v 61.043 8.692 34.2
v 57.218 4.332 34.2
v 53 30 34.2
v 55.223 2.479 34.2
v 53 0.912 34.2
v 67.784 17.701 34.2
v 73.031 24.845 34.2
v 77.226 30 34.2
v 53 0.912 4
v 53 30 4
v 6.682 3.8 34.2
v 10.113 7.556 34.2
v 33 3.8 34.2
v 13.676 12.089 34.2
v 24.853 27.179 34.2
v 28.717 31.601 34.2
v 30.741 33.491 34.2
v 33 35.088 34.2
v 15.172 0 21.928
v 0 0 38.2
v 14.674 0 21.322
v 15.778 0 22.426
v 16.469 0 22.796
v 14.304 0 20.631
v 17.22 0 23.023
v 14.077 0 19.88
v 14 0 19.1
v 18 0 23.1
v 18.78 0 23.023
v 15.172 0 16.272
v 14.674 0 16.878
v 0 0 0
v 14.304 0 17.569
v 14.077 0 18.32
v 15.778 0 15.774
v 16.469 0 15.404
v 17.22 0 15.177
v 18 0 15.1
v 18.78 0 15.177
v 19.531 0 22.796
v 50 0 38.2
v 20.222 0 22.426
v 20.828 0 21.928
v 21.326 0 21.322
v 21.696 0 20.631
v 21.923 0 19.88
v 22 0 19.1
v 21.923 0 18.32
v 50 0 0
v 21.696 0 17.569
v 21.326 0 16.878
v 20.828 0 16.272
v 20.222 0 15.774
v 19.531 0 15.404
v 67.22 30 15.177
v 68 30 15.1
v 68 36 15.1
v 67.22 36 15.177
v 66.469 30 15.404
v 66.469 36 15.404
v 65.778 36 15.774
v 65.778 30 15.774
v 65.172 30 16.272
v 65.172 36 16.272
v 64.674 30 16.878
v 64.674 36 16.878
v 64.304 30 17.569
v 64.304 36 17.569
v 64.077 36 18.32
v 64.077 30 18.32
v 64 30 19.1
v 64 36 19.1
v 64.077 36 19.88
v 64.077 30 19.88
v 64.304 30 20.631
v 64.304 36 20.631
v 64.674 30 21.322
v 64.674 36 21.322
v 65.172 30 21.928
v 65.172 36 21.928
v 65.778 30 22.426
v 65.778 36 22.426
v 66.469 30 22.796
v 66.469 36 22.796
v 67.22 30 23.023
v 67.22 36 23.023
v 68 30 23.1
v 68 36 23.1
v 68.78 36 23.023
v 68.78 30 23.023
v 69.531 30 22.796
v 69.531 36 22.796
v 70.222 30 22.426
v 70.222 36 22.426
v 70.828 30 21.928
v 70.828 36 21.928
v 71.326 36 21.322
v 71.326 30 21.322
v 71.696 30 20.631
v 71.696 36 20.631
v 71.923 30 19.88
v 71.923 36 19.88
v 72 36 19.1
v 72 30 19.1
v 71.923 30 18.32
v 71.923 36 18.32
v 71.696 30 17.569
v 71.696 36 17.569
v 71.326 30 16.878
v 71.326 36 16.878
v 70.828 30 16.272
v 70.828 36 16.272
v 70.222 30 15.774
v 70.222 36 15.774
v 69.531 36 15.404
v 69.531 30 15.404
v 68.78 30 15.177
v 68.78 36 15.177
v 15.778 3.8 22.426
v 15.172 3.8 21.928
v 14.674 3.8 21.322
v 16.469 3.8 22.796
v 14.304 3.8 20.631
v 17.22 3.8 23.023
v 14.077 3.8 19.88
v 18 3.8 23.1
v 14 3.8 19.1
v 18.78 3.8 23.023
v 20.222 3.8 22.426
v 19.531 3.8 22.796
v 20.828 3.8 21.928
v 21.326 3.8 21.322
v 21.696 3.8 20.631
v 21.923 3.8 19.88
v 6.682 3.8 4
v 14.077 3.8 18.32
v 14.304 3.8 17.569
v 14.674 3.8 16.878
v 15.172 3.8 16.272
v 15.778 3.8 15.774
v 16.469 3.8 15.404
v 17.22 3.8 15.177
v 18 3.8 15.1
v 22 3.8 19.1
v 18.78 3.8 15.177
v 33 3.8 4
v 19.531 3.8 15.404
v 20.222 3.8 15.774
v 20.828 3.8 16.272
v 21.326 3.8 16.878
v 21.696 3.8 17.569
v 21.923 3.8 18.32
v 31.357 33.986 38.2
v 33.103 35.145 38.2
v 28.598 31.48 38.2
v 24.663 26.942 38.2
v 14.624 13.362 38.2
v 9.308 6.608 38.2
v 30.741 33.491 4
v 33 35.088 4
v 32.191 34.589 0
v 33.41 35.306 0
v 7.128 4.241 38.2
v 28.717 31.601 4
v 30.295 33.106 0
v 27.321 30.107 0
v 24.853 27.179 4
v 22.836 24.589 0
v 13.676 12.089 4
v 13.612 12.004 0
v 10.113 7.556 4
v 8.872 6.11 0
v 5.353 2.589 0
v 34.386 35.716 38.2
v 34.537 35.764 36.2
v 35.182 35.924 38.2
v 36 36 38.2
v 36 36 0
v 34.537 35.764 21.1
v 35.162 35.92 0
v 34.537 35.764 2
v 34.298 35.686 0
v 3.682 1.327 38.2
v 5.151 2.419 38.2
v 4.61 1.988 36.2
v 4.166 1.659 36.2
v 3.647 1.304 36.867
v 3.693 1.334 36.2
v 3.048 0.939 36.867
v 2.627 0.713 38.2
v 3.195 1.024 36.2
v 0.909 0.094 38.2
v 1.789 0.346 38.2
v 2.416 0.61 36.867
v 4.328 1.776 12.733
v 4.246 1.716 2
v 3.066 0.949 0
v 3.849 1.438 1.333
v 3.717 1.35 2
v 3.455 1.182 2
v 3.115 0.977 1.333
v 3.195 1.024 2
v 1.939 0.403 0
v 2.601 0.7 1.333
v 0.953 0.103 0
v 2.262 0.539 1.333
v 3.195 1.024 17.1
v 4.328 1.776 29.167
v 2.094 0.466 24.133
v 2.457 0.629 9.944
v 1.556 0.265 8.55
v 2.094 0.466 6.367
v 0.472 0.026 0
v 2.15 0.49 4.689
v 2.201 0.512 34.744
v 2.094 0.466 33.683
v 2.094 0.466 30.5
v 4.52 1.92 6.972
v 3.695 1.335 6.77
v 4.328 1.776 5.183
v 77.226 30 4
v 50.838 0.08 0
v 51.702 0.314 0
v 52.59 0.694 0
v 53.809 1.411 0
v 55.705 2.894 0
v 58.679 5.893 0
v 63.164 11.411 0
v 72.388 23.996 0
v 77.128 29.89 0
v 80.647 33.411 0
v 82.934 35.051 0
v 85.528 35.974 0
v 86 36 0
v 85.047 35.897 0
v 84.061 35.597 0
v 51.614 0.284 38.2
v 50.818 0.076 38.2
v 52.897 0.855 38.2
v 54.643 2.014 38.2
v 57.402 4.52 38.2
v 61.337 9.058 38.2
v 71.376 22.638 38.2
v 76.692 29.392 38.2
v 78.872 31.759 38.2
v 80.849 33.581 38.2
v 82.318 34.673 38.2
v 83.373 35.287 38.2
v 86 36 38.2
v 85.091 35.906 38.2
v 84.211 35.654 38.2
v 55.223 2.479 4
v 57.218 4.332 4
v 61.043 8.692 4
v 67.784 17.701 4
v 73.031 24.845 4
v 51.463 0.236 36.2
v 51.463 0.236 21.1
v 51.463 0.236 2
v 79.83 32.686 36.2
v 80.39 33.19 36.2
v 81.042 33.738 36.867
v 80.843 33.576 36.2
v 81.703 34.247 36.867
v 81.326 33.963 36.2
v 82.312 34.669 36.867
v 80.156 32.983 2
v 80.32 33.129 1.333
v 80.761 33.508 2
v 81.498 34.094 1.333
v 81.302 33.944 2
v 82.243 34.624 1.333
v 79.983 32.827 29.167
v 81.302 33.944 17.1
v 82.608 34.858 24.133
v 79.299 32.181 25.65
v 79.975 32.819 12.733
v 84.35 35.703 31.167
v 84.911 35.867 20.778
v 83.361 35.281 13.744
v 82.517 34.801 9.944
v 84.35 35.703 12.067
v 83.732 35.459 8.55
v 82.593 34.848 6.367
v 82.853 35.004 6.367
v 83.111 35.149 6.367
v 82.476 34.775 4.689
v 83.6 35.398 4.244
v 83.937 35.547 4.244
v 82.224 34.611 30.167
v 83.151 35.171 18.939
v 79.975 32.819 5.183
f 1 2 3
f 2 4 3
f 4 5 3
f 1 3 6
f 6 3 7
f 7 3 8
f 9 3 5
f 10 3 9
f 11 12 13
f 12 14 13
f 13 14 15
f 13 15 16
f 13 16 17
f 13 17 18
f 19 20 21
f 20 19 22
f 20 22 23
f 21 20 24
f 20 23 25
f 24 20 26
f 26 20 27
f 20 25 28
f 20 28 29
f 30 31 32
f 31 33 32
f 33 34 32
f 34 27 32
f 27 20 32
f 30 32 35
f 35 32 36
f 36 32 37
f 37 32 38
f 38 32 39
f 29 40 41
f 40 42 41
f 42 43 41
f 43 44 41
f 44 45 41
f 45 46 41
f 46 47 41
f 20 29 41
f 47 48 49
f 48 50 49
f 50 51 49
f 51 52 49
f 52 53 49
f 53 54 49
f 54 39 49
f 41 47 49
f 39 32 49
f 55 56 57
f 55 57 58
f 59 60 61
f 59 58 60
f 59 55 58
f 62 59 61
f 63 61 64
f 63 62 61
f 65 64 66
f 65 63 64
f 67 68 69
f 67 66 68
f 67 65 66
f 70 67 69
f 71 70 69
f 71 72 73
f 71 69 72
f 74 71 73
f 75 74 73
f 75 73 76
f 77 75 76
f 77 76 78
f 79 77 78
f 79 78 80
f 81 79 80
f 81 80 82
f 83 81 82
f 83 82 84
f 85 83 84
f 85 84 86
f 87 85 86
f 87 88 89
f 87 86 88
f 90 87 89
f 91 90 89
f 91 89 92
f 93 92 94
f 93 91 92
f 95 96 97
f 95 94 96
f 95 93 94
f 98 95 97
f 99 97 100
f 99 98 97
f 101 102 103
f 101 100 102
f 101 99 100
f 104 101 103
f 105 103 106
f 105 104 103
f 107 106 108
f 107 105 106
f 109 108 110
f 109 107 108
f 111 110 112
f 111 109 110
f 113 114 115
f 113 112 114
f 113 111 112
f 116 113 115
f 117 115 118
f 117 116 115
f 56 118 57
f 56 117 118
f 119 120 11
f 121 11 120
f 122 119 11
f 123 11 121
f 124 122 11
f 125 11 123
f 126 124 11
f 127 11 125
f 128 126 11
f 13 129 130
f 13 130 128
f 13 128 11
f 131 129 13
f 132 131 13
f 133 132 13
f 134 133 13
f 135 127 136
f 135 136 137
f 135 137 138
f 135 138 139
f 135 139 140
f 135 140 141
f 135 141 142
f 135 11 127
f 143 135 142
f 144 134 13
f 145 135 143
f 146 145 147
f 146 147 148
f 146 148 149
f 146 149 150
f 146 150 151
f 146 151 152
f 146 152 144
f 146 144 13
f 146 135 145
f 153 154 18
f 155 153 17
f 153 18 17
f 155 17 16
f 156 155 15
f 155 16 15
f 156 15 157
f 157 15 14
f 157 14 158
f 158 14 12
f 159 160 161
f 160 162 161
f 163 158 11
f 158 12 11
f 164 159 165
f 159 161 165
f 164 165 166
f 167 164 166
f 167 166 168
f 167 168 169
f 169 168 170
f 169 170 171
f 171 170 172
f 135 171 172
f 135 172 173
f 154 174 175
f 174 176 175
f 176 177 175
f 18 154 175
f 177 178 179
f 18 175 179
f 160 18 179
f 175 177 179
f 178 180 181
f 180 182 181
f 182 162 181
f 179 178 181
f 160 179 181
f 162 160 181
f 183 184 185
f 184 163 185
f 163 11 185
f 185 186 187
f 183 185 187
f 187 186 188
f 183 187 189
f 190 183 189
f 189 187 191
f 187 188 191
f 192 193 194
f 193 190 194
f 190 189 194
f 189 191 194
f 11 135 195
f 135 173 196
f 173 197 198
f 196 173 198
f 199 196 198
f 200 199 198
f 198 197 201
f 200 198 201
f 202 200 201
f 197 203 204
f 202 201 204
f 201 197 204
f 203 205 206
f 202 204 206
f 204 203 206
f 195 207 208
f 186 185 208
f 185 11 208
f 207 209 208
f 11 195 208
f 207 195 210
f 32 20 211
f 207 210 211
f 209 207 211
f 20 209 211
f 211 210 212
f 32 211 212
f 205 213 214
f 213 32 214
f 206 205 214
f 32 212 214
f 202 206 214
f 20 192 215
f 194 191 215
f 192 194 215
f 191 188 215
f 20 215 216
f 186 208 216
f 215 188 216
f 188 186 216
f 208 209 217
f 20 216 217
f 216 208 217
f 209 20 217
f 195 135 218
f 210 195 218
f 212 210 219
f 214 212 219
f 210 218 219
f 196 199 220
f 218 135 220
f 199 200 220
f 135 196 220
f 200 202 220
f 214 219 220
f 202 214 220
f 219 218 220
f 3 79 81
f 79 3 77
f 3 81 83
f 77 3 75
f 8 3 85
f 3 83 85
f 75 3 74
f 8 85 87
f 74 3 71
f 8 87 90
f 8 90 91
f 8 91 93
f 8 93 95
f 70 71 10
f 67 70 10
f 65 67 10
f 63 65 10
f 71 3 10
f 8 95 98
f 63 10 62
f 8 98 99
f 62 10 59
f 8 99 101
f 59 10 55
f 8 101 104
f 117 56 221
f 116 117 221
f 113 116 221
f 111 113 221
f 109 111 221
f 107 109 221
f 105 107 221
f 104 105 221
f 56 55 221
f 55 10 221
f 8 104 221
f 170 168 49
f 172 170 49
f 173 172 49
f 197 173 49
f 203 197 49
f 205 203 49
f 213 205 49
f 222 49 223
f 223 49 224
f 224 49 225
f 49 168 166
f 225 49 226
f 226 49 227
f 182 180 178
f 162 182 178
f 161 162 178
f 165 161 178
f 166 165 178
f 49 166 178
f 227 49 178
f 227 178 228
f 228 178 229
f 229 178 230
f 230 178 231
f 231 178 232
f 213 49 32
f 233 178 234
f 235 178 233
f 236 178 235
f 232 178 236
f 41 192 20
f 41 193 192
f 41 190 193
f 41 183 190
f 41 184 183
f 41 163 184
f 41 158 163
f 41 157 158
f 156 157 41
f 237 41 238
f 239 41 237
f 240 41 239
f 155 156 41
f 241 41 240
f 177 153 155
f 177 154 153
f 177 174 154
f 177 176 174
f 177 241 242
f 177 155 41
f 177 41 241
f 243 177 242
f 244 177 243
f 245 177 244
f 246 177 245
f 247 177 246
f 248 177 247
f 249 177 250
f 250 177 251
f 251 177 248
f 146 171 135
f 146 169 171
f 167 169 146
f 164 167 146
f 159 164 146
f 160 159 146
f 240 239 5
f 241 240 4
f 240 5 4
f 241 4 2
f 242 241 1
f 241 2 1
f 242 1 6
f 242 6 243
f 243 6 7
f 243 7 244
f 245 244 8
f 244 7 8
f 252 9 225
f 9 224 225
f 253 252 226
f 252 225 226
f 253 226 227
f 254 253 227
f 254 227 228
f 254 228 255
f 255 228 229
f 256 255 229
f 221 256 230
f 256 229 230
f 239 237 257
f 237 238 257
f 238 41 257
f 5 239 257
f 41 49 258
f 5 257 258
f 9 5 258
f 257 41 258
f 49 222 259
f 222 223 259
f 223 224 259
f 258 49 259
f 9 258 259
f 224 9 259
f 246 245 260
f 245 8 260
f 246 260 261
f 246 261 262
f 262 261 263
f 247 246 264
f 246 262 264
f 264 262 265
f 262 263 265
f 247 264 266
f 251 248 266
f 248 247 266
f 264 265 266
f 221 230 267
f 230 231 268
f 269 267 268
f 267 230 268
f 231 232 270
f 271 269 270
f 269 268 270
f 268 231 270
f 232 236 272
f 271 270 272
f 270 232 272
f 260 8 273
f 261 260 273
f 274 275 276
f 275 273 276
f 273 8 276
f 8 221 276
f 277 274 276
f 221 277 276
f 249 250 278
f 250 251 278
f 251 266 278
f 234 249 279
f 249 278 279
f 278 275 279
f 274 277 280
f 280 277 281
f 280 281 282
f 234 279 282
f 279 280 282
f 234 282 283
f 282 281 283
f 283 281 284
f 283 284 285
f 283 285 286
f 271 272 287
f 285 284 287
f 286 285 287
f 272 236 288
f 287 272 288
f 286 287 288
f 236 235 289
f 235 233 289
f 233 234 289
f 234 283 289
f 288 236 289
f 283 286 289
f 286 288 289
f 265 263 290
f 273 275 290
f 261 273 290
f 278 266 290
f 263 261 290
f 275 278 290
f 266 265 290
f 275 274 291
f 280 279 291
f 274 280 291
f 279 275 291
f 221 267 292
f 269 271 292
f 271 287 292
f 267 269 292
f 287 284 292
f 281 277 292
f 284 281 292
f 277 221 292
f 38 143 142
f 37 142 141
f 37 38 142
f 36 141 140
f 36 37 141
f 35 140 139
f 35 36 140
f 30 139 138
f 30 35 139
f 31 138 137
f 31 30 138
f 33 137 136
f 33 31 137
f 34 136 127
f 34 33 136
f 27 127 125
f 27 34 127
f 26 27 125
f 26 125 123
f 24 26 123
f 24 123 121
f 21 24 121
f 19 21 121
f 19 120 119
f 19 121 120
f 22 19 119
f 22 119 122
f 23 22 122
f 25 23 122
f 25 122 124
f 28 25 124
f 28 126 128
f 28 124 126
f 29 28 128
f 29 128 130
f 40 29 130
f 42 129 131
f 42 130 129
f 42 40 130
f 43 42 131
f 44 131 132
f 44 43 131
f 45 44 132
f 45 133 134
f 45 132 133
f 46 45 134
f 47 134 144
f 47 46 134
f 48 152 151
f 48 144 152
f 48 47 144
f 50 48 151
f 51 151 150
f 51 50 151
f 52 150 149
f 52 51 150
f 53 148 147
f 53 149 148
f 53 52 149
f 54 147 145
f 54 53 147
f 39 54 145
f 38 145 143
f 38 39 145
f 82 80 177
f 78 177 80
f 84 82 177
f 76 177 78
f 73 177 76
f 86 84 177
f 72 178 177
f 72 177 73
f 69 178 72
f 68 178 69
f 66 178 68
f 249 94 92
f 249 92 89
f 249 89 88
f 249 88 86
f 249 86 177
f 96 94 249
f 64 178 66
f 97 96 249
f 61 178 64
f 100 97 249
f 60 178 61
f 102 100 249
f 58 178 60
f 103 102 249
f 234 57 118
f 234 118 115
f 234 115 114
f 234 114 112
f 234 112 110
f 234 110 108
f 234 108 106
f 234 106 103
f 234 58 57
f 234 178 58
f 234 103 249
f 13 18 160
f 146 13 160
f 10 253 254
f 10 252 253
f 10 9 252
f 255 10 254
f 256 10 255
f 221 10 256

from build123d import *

# Parameters (mm, degrees)
SKETCH1_W           = 86
SKETCH1_H           = 36
BOSS_EXTRUDE1_DEPTH = 38.2
CUT_EXTRUDE2_DEPTH  = 101.753362227
SKETCH3_R           = 4
CUT_EXTRUDE5_DEPTH  = 101.753362386
SKETCH3_9_R         = 4
CUT_EXTRUDE7_DEPTH  = 101.753362386
SKETCH6_W           = 33
SKETCH6_H           = 30.2
CUT_EXTRUDE8_DEPTH  = 32.2
CUT_EXTRUDE9_START  = -6
SKETCH6_8_W         = 33
SKETCH6_8_H         = 30.2
CUT_EXTRUDE9_DEPTH  = 95.753362386


with BuildPart() as part:
    # Sketch1 → Boss-Extrude1 (new body)
    with BuildSketch(Plane.XY):
        with Locations((43, 18)):
            Rectangle(SKETCH1_W, SKETCH1_H)
    extrude(amount=BOSS_EXTRUDE1_DEPTH)

    # Sketch2 → Cut-Extrude2 (cut, through all)
    with BuildSketch(Plane.XY):
        with BuildLine():
            Line((86, 36), (86, 0))
            Line((86, 0), (50, 0))
            add(Edge.make_bspline(
                [(50, 0), (60, 0), (76, 36), (86, 36)],
                knots=[0, 0, 0, 0, 1, 1, 1, 1], degree=3))
        make_face()
        with BuildLine():
            Line((36, 36), (0, 36))
            Line((0, 36), (0, 0))
            add(Edge.make_bspline(
                [(36, 36), (26, 36), (10, 0), (0, 0)],
                knots=[0, 0, 0, 0, 1, 1, 1, 1], degree=3))
        make_face()
    extrude(amount=CUT_EXTRUDE2_DEPTH, mode=Mode.SUBTRACT)

    # Sketch3 → Cut-Extrude5 (cut, through all)
    with BuildSketch(Plane(origin=(0, 0, 0), x_dir=(1, 0, 0), z_dir=(0, 1, 0))):
        with Locations((18, -19.1)):
            Circle(SKETCH3_R)
    extrude(amount=CUT_EXTRUDE5_DEPTH, mode=Mode.SUBTRACT)

    # Sketch3<9> → Cut-Extrude7 (cut, through all)
    with BuildSketch(Plane(origin=(0, 0, 0), x_dir=(1, 0, 0), z_dir=(0, 1, 0))):
        with Locations((68, -19.1)):
            Circle(SKETCH3_9_R)
    extrude(amount=CUT_EXTRUDE7_DEPTH, mode=Mode.SUBTRACT)

    # Sketch6 → Cut-Extrude8 (cut)
    with BuildSketch(Plane(origin=(0, 36, 0), x_dir=(1, 0, 0), z_dir=(0, 1, 0))):
        with Locations((16.5, -19.1)):
            Rectangle(SKETCH6_W, SKETCH6_H)
    extrude(amount=-CUT_EXTRUDE8_DEPTH, mode=Mode.SUBTRACT)

    # Sketch6<8> → Cut-Extrude9 (cut, through all)
    with BuildSketch(Plane(origin=(0, 36, 0), x_dir=(1, 0, 0), z_dir=(0, 1, 0)).offset(CUT_EXTRUDE9_START)):
        with Locations((69.5, -19.1)):
            Rectangle(SKETCH6_8_W, SKETCH6_8_H)
    extrude(amount=-CUT_EXTRUDE9_DEPTH, mode=Mode.SUBTRACT)


solid = part.part
